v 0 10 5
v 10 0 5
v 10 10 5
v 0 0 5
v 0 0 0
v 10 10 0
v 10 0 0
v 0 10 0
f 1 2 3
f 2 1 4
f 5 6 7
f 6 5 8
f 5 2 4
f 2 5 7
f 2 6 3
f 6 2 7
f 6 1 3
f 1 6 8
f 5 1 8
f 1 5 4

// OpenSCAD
/*
 * Customizable Origami - Hokum
 * 
 * created 2017-11-23
 * version v1.0
 *
 * Changelog
 * --------------
 * v2.0:
 *      - final design
 * --------------
 * 
 * This work is licensed under the Creative Commons - Attribution - NonCommercial - ShareAlike license.
 * https://creativecommons.org/licenses/by-nc-sa/3.0/
 */


// preview[view:north, tilt:top]

// The maximum size of creation. Or the minimum, depending on your viewpoint.
hokum_pokum = 10; //[20:300]

// Higher.
dont_use_its_dangerous = 10; //[0.2:0.2:100]

// No idea what this does
No_idea_what_this_does = 5; 

// Flip model
flip_model = "no"; //[yes,no]


module TheThing()
{
    cube([hokum_pokum,dont_use_its_dangerous,No_idea_what_this_does]);
}

if(flip_model == "yes") {
    mirror([0,1,0]) {
        rotate([180,180,0]) {    
            TheThing();
        }
    }
} else {
    TheThing();
}
